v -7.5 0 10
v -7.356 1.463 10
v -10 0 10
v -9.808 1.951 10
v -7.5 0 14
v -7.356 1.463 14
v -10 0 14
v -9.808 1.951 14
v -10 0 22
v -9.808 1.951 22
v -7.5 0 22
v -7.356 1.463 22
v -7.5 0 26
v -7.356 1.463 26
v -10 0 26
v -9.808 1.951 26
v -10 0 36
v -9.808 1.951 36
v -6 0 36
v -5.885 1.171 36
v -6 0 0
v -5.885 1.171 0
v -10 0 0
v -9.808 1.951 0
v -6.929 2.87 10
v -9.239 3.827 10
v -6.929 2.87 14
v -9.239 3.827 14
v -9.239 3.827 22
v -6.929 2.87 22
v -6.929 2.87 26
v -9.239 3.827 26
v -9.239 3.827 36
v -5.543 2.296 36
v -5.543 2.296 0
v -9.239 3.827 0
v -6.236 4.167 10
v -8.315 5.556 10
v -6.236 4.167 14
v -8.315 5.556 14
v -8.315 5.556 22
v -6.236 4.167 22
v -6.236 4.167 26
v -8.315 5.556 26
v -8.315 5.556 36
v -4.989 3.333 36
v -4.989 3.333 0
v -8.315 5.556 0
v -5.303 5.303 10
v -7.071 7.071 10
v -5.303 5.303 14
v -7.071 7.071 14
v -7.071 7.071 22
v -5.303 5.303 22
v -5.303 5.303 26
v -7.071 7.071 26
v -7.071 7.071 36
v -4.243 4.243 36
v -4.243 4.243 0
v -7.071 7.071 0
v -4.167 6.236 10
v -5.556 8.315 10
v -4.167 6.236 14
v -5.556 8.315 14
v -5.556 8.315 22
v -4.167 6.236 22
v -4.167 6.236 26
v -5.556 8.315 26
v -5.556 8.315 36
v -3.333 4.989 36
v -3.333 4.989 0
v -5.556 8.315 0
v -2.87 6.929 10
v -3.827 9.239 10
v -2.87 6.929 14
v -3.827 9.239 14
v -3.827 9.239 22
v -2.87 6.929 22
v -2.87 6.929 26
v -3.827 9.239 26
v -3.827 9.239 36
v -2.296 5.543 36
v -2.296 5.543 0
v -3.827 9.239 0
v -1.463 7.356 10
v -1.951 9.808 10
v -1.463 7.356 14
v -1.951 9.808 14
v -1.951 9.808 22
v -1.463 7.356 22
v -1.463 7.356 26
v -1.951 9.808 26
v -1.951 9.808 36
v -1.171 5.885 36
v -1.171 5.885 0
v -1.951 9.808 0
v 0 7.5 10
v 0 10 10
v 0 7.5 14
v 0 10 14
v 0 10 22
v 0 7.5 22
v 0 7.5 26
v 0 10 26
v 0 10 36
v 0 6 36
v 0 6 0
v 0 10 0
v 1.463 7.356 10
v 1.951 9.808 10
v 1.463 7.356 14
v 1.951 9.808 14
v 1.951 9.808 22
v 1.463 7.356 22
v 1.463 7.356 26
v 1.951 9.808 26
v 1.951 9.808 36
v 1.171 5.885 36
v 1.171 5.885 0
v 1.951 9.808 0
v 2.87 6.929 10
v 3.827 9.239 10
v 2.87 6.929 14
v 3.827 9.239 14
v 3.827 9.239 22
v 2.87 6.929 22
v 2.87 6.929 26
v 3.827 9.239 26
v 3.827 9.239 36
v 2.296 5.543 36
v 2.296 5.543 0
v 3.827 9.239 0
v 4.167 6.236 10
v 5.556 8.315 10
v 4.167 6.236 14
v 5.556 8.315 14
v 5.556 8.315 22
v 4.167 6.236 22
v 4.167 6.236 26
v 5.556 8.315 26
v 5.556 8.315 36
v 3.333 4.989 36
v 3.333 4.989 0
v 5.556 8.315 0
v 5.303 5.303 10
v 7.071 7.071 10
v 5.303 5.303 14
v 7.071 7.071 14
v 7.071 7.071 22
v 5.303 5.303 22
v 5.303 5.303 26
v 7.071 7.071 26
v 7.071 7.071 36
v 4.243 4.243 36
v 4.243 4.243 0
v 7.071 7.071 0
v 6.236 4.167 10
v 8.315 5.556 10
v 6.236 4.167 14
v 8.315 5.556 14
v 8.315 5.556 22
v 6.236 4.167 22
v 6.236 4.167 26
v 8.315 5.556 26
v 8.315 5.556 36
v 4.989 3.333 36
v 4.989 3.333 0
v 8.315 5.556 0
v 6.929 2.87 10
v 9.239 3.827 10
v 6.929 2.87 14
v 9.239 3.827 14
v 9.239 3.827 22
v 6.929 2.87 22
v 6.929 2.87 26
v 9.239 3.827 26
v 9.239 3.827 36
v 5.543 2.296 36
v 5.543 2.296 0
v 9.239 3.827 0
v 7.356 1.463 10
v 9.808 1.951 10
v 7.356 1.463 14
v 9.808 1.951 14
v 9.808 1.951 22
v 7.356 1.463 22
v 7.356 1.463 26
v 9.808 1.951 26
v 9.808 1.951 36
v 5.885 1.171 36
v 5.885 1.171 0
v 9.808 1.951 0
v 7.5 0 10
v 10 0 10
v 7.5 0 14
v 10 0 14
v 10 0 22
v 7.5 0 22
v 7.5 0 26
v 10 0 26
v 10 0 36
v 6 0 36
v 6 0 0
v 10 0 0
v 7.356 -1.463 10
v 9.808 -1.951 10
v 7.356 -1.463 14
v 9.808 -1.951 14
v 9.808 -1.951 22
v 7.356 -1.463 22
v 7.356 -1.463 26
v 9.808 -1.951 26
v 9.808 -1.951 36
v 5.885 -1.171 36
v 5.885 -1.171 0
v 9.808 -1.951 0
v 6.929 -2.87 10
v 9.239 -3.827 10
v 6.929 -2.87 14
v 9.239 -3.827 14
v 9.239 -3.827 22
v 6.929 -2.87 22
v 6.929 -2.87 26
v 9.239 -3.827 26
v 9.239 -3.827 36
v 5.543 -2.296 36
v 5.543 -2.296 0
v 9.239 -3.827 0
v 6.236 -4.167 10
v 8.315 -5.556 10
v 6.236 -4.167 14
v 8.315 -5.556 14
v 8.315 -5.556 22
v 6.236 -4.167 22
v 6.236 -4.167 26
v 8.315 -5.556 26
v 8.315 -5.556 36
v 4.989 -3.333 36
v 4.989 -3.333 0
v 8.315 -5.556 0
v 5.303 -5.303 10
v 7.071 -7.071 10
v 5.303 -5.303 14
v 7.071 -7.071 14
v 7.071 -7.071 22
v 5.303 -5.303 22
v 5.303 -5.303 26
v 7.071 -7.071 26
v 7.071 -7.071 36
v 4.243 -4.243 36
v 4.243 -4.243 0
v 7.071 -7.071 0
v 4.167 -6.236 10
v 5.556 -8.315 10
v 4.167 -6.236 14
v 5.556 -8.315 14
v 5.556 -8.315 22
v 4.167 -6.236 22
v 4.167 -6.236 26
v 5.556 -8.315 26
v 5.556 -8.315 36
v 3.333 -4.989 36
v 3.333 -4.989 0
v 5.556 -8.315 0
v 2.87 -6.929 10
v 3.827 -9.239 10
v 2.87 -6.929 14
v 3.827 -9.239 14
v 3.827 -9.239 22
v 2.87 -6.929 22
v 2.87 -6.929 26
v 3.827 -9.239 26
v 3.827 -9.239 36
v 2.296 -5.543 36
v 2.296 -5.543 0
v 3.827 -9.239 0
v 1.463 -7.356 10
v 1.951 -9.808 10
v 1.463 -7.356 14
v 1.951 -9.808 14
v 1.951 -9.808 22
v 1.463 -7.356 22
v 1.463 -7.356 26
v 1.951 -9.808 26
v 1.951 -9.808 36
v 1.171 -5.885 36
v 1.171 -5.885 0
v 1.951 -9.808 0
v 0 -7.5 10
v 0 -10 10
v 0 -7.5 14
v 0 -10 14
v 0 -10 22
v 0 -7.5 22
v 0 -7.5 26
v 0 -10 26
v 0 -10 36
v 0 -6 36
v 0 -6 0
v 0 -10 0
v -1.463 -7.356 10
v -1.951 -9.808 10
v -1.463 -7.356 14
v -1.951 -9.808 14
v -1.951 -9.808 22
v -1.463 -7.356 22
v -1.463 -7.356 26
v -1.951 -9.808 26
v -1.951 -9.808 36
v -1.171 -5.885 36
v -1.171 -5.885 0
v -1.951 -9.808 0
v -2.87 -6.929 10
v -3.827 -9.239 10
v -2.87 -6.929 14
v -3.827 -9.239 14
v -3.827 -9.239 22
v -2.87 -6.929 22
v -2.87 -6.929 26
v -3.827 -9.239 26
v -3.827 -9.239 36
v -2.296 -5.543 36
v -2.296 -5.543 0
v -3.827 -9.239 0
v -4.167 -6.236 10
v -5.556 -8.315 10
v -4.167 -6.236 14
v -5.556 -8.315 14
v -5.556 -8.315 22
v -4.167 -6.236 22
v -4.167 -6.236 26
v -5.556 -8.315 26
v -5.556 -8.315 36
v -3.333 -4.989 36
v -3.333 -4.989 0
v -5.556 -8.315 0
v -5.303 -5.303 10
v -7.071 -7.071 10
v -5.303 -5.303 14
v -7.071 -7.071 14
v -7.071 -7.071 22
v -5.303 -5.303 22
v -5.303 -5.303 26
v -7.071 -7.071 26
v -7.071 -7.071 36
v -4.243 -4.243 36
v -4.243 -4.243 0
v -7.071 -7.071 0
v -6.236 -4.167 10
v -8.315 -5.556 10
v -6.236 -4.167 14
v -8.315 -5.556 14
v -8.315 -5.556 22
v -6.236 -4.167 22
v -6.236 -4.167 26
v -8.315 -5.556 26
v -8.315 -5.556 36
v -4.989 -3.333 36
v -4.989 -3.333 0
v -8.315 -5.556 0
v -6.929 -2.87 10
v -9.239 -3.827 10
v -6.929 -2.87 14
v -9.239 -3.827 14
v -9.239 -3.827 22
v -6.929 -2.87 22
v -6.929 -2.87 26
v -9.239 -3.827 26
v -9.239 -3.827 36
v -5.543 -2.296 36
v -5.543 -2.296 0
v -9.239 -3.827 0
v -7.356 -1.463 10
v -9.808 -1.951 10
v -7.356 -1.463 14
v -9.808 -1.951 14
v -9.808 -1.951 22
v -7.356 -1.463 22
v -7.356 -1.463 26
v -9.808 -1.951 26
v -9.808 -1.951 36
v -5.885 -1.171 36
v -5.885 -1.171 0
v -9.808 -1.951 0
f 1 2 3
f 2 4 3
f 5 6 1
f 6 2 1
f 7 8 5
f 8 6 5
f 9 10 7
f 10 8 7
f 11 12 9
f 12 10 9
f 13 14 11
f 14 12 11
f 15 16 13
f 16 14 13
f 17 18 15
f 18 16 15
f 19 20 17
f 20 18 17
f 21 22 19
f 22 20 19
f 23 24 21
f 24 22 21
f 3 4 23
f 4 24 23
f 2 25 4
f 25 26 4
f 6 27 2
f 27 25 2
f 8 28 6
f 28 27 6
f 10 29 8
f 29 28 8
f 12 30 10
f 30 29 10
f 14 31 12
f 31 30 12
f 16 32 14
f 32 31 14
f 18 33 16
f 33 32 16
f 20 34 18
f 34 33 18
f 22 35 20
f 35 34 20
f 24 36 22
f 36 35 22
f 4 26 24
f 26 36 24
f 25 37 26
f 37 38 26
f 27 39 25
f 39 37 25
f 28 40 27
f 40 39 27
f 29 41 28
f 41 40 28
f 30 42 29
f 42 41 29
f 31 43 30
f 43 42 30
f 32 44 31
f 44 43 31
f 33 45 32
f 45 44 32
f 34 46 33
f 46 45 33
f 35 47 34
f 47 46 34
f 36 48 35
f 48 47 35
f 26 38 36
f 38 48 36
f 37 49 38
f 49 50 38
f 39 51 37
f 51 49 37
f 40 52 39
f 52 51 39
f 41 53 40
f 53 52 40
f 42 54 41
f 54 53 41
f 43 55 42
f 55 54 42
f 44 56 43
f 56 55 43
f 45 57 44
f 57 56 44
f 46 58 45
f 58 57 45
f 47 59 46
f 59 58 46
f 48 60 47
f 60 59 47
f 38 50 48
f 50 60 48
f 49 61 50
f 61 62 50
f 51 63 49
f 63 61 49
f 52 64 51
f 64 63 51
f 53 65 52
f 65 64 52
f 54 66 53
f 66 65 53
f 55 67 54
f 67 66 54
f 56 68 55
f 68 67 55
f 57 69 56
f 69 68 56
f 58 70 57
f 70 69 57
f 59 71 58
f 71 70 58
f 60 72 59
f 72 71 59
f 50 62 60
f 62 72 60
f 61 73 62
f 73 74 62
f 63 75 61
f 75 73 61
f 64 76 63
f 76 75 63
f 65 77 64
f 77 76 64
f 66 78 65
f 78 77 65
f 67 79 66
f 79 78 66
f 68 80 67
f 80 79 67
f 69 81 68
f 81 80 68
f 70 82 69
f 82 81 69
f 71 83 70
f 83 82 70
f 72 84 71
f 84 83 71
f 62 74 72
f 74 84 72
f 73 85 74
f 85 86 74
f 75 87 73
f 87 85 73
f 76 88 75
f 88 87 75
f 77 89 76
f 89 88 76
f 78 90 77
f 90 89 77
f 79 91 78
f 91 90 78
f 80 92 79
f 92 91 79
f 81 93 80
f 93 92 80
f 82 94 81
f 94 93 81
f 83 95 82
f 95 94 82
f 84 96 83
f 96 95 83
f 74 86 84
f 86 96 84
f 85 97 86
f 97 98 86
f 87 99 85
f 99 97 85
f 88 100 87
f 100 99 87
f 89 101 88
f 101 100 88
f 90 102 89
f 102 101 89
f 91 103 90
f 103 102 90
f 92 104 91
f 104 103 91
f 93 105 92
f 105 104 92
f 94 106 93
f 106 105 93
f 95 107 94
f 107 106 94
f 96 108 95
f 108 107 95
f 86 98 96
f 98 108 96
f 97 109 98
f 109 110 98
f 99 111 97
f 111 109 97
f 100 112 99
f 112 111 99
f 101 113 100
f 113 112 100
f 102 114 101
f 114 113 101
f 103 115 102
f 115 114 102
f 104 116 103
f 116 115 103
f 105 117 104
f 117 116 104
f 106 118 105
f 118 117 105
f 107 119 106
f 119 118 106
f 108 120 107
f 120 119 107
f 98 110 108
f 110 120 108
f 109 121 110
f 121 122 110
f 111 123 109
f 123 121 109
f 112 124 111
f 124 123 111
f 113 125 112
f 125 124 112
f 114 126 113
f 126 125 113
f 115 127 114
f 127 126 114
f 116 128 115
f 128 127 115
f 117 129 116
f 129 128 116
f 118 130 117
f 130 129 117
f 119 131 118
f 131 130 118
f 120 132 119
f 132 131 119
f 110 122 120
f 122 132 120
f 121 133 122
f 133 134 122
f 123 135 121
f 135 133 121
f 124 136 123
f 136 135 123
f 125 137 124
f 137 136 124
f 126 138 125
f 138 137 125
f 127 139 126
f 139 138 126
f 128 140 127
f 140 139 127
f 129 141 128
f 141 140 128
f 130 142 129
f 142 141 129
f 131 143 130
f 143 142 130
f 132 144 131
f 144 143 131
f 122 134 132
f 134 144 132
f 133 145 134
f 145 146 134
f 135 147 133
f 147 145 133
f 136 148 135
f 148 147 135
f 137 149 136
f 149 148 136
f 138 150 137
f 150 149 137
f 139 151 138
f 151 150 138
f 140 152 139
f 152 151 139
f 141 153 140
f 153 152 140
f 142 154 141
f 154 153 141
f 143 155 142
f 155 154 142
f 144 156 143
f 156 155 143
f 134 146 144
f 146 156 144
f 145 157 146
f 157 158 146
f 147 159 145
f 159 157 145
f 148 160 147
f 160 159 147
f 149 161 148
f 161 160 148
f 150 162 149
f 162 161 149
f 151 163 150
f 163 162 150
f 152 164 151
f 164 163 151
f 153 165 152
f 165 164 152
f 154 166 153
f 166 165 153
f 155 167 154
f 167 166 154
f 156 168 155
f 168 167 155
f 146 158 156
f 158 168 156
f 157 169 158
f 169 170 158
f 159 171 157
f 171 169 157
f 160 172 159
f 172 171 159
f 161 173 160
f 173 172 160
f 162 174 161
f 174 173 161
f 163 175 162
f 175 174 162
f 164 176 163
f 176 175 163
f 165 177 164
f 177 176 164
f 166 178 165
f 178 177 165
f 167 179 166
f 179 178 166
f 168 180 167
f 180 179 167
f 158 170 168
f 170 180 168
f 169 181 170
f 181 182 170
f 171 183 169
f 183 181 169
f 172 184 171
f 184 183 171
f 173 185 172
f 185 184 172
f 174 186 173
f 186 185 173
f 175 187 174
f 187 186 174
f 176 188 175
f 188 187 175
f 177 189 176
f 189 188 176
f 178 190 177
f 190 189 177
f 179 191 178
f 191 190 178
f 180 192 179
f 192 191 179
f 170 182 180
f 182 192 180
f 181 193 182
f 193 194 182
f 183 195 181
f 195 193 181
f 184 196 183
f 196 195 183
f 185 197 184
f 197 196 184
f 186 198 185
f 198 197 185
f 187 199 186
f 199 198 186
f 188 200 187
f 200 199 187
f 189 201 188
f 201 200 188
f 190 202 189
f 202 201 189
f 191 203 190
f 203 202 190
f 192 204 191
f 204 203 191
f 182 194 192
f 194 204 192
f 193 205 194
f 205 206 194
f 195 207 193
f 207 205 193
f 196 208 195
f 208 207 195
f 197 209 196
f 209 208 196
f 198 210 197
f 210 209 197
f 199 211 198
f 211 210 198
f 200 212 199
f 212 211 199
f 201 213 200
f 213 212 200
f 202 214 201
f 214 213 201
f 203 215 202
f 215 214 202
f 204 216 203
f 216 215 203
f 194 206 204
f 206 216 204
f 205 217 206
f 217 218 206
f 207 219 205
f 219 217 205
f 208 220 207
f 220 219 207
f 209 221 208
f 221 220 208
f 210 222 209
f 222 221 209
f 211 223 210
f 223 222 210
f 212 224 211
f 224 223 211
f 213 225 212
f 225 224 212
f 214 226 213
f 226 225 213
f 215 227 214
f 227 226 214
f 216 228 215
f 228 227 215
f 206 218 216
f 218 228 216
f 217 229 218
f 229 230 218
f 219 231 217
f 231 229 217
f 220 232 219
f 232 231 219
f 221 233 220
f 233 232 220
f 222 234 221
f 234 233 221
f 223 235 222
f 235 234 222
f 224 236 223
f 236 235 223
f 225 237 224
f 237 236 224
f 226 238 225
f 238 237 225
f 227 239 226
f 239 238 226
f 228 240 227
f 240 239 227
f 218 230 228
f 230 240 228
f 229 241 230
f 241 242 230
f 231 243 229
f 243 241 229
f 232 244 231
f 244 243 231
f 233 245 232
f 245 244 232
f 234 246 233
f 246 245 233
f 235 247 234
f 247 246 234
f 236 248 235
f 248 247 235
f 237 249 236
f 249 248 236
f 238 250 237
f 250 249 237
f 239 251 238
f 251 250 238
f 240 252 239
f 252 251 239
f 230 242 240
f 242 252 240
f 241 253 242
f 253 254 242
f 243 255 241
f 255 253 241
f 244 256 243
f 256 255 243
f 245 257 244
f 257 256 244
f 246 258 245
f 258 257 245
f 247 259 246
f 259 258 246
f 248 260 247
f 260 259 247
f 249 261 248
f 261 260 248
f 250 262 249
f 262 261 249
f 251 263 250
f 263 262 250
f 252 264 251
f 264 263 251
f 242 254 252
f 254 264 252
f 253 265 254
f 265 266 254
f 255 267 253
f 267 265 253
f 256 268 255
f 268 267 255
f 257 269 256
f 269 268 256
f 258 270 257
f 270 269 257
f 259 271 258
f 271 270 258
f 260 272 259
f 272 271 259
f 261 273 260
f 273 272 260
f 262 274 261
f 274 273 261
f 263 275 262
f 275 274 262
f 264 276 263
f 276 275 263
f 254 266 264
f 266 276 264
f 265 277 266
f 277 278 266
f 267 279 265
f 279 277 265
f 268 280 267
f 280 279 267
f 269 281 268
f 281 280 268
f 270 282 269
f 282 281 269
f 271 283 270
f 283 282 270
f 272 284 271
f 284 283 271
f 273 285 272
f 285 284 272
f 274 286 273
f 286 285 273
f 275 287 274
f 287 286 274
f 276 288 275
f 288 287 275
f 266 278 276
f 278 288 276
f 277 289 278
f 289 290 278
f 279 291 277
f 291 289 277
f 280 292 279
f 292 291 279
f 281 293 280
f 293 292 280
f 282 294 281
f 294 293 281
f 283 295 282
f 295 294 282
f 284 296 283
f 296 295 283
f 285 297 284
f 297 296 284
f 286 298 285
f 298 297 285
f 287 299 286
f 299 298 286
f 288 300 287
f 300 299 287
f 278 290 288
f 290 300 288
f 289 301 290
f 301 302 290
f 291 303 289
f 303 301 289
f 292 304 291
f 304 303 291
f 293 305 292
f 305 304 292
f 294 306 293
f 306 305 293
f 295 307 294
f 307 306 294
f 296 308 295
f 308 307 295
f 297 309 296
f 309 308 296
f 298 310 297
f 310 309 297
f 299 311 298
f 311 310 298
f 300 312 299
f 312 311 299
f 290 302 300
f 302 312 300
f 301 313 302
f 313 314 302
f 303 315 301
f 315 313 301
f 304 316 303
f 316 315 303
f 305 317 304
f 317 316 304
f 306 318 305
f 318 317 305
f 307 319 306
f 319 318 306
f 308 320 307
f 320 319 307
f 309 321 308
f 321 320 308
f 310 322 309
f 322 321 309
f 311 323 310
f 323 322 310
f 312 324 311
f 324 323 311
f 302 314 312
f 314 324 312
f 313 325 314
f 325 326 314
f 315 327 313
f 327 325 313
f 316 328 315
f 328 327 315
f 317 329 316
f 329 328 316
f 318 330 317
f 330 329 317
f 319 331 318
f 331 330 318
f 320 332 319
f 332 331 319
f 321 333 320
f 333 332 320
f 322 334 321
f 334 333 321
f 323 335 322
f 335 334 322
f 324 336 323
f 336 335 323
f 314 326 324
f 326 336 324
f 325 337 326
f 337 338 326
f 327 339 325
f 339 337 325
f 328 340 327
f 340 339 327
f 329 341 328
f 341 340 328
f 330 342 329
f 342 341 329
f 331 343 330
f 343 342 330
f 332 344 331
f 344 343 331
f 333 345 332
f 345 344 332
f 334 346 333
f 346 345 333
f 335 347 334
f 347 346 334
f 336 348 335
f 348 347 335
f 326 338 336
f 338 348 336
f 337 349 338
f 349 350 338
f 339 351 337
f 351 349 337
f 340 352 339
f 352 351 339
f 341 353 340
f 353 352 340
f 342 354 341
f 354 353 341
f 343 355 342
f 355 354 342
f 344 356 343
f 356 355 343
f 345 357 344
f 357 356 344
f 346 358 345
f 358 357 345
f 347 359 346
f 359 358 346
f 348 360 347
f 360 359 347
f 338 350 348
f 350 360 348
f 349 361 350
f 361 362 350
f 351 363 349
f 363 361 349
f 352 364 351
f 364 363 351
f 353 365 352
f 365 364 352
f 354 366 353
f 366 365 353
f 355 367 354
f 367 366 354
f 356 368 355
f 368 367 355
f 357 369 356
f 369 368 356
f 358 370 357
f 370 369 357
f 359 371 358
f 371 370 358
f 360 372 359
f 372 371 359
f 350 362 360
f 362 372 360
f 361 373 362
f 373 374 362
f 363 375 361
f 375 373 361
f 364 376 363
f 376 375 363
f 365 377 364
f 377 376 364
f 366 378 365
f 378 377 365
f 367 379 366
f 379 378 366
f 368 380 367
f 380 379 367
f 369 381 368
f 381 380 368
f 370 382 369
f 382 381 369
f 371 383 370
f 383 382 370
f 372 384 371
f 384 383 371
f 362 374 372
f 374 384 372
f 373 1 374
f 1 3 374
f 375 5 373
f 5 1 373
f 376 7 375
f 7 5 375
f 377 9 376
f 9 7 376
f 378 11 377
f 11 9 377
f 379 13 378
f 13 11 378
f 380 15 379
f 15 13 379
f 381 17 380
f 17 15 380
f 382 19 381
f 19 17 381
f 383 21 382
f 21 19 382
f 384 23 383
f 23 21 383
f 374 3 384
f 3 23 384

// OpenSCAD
$fn = 32;

// ----------------------------------------------------------------------
// Grooved revolve: stepped, bore R6
// ----------------------------------------------------------------------

// --- parameters (mm) ---
bore_r = 6;               // bore radius
outer_r = 10;             // outer radius of the body
total_h = 36;             // overall height, Z
wall = 4;                 // radial wall thickness
groove_w = 4;             // groove width
groove_d = 2.5;           // groove depth
grooves = 2;              // number of outer grooves

bbox_x = 2 * outer_r;  // full diameter
bore_d = 2 * bore_r;  // bore diameter
body_d = 2 * outer_r;  // body diameter
revolve_angle = 360;  // full turn around the Z axis

profile = [[6, 0], [10, 0], [10, 10], [7.5, 10], [7.5, 14], [10, 14], [10, 22], [7.5, 22], [7.5, 26], [10, 26], [10, 36], [6, 36]];  // primary outline, 12 points, counter clockwise

// --- the one profile operation ---
rotate_extrude(angle = revolve_angle) polygon(points = profile);
